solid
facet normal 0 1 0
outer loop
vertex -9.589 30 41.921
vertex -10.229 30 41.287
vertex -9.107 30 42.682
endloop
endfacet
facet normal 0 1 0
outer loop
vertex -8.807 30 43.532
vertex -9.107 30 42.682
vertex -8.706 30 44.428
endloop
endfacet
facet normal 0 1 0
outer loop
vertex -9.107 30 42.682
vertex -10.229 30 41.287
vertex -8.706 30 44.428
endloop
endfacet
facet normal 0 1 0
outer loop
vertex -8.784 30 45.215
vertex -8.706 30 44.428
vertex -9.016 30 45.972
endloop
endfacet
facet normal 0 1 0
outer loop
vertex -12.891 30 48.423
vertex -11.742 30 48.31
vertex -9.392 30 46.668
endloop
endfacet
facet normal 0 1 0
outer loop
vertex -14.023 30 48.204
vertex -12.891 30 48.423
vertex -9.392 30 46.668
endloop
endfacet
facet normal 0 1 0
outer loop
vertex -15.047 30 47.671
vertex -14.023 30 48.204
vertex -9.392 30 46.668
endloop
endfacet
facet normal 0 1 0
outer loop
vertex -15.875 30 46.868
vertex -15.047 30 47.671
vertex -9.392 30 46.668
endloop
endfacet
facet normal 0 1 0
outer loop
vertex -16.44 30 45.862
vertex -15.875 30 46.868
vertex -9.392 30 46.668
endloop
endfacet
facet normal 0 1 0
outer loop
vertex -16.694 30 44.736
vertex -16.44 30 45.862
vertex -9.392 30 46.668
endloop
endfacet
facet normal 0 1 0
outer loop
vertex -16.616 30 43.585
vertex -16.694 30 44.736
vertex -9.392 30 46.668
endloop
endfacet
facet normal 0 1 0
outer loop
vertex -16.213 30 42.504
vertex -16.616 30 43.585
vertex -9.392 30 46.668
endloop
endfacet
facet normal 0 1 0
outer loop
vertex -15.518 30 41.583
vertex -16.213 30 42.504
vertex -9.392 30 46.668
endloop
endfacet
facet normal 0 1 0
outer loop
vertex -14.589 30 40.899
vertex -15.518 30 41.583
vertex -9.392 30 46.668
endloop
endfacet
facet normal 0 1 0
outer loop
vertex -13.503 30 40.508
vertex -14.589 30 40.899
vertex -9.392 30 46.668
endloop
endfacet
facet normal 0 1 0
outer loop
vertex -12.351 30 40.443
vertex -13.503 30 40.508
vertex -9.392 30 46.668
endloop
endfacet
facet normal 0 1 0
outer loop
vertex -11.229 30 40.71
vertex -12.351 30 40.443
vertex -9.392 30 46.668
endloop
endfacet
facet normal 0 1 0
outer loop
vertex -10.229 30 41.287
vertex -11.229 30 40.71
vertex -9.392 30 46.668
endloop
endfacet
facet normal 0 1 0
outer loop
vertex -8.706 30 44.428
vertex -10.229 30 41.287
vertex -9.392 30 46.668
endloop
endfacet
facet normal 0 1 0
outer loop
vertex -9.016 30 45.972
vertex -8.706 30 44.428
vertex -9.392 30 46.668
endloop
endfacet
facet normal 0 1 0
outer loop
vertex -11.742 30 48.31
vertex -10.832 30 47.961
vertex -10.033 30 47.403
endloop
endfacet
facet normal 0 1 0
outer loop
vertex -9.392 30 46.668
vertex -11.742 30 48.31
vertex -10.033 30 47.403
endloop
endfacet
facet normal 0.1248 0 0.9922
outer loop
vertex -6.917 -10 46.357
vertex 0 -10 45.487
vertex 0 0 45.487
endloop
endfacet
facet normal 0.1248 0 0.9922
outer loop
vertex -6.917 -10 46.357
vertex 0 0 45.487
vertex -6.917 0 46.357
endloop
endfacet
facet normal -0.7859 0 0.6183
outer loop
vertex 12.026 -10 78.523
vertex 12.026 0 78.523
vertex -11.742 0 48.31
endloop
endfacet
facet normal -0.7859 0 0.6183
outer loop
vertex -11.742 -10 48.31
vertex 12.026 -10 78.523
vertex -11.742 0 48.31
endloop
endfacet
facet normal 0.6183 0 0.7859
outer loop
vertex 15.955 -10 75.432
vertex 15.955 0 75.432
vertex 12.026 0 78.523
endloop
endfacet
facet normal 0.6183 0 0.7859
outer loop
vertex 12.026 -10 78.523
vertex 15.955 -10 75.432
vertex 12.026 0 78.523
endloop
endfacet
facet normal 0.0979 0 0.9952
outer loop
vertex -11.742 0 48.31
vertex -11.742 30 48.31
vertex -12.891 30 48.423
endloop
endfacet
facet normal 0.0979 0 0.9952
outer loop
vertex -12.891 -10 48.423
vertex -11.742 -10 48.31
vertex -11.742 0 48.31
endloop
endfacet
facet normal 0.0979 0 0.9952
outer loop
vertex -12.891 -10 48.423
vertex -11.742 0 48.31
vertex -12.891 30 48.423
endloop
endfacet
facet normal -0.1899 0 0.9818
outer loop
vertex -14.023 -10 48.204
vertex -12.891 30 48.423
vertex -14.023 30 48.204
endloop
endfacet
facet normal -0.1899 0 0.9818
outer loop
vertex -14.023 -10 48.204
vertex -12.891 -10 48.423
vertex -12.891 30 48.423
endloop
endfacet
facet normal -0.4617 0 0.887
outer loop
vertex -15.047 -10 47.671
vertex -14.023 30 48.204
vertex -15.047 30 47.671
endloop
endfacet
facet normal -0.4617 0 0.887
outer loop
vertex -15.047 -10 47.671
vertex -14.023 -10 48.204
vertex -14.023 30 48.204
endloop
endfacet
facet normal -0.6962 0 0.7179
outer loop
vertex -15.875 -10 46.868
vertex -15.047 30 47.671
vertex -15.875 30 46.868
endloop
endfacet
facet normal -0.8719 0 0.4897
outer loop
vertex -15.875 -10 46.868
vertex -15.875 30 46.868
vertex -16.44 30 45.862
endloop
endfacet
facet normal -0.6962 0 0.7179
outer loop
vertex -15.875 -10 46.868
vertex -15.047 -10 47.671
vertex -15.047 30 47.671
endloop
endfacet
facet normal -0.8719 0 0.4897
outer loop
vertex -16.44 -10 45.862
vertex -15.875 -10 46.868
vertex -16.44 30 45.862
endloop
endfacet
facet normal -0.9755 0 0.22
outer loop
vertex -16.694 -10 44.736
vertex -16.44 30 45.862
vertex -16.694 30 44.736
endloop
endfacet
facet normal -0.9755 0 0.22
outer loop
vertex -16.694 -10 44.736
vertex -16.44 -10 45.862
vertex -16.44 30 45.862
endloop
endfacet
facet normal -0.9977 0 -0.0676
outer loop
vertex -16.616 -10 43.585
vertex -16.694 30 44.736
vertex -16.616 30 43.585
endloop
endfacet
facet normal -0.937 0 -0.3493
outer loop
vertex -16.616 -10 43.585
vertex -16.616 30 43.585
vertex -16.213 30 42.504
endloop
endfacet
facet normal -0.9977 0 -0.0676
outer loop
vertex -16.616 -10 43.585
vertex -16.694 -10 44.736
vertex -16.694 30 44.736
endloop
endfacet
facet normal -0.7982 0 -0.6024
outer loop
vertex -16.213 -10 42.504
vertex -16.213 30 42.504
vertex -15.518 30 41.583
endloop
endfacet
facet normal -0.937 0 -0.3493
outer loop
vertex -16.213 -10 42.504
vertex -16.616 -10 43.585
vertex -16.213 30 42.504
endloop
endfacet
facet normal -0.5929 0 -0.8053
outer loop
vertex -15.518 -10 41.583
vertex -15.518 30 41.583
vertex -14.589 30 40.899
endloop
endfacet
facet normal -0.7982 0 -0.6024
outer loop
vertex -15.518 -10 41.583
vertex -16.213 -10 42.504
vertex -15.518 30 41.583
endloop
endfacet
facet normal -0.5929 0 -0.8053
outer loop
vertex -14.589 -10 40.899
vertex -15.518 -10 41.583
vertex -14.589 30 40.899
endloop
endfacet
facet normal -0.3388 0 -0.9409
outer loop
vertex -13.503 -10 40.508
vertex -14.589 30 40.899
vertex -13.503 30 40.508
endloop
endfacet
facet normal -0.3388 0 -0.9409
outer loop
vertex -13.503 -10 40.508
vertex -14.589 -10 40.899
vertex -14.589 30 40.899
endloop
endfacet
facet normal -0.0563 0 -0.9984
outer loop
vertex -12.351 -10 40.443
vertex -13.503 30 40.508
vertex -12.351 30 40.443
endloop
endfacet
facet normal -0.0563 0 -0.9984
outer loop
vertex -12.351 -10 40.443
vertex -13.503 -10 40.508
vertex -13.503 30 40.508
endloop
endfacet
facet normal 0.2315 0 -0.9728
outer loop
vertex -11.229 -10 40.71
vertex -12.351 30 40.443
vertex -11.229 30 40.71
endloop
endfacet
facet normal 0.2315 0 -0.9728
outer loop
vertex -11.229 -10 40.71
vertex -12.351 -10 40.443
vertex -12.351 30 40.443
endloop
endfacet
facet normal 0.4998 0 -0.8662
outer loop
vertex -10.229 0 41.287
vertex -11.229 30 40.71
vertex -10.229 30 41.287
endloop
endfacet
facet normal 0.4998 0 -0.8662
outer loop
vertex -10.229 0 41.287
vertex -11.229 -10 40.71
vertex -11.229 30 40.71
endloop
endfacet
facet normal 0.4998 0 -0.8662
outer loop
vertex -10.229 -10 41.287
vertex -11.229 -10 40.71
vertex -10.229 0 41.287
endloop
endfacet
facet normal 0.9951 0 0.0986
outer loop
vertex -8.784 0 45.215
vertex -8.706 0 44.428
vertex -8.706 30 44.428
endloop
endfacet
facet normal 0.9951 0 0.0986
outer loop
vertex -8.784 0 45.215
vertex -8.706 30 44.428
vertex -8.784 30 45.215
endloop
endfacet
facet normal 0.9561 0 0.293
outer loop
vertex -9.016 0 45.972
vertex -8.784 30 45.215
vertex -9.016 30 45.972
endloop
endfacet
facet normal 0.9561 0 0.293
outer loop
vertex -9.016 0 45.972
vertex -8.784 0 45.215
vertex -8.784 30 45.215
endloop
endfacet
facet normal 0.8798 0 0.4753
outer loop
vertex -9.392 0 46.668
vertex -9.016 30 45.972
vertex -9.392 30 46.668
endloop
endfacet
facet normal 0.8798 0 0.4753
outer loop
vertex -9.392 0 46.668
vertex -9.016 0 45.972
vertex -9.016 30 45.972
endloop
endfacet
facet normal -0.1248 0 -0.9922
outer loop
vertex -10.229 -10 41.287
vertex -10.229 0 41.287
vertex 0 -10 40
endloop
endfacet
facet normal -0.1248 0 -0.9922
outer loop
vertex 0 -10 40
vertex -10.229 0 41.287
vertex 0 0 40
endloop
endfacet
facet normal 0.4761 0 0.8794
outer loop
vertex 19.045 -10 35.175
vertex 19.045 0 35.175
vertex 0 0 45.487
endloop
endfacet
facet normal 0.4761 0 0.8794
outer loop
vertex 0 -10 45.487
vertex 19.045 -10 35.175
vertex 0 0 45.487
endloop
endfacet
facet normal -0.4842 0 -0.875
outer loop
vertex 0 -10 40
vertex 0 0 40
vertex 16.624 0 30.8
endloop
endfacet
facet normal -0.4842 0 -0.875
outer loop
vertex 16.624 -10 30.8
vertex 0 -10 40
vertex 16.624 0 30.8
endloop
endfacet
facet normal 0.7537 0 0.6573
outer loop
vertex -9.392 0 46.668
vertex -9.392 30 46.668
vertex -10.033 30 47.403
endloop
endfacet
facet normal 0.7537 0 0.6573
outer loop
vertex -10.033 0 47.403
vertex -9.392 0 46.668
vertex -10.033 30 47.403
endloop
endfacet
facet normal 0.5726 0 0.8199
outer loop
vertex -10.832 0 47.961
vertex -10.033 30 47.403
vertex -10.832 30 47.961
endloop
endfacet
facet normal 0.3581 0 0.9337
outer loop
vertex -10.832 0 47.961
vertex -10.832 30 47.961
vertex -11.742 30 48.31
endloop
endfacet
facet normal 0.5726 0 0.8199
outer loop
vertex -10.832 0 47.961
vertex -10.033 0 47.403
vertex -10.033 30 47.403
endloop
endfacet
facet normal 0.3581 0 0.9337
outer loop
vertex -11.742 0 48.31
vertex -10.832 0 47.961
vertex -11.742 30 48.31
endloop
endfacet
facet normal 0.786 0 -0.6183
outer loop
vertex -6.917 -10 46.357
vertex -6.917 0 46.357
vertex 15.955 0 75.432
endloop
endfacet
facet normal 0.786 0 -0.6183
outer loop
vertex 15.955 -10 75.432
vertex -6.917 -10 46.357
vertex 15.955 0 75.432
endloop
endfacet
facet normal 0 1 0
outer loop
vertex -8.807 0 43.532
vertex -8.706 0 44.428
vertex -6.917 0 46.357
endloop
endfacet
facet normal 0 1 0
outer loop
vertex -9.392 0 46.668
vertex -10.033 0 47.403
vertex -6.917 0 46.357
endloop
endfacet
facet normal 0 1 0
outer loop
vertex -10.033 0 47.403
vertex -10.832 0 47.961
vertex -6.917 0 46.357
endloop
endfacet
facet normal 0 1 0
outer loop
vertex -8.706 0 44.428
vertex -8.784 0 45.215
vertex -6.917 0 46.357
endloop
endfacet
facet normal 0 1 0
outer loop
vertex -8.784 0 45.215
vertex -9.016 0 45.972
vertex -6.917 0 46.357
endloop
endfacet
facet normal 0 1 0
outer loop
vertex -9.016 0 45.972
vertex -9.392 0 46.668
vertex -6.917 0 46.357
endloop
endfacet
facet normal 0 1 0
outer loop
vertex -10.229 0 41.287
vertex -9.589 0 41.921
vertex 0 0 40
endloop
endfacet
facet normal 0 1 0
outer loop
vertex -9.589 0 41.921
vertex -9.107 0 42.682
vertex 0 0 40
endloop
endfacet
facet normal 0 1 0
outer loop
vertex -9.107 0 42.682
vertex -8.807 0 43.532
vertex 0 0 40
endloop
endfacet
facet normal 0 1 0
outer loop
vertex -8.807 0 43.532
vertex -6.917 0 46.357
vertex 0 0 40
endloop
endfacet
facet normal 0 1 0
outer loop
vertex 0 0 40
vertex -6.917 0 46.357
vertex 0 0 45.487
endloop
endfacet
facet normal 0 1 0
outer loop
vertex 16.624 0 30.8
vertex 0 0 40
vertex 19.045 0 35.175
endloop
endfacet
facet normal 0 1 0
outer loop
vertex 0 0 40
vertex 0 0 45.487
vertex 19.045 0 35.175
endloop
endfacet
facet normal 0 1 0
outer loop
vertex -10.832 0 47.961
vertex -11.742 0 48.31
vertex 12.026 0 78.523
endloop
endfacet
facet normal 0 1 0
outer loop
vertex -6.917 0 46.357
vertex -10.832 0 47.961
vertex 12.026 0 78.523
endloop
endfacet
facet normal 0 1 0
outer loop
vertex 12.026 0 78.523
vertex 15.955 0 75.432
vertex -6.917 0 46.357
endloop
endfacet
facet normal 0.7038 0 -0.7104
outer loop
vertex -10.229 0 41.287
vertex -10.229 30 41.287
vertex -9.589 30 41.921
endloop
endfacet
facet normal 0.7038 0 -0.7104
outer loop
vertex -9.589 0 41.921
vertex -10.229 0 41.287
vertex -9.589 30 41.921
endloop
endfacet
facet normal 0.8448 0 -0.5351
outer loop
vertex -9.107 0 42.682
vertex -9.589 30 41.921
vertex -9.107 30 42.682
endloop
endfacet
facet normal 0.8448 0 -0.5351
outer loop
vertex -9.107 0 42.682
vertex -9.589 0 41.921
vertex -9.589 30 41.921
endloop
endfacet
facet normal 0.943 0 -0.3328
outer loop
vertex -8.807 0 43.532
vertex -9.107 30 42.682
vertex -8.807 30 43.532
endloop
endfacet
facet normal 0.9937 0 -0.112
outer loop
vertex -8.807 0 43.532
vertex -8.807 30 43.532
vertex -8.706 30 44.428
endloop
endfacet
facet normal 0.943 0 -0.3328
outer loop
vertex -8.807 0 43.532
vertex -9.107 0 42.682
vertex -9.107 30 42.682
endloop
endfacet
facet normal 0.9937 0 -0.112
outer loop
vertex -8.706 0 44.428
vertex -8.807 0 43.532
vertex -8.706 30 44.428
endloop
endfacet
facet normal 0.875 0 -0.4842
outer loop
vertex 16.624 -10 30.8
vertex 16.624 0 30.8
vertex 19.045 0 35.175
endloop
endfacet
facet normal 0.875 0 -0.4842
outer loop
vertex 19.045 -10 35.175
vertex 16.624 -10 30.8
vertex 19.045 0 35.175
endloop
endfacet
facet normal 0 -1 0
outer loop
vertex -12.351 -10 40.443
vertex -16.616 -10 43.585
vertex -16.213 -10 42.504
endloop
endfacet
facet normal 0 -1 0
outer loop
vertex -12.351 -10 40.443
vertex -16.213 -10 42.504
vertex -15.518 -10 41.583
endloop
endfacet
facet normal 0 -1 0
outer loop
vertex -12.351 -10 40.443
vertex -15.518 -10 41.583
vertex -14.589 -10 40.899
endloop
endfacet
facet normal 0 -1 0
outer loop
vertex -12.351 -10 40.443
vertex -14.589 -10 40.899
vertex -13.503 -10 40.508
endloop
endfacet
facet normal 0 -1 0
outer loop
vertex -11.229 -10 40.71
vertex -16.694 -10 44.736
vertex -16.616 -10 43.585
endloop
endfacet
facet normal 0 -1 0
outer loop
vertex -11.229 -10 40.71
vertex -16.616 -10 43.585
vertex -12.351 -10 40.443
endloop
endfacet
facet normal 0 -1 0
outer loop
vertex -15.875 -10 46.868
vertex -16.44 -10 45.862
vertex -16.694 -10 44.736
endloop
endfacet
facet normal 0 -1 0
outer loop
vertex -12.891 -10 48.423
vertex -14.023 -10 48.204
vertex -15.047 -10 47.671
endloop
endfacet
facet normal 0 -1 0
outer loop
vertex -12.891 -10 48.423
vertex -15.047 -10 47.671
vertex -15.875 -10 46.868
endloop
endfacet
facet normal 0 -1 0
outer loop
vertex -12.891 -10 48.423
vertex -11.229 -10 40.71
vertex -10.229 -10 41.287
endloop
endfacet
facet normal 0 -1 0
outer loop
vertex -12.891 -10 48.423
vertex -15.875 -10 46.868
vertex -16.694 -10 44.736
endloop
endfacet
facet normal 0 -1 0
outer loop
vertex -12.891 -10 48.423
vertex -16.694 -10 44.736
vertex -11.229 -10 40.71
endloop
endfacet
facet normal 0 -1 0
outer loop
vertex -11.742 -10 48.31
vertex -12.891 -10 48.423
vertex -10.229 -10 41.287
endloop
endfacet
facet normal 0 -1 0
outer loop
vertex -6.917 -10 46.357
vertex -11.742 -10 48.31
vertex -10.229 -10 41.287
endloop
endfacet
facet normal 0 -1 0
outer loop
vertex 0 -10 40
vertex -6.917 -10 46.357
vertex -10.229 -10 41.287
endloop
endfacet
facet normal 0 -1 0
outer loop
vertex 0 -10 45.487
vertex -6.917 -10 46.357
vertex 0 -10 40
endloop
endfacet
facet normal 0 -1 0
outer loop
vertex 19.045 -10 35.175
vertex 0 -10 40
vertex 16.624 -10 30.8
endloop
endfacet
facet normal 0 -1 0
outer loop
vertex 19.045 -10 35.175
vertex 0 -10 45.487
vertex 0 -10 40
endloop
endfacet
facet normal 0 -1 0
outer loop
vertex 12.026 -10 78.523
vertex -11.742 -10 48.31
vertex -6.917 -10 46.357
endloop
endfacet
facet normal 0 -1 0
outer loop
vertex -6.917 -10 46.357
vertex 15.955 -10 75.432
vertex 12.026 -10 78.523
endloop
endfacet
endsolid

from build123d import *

# Parameters (mm, degrees)
F1_DEPTH = 10
F2_DEPTH = 10
F3_DEPTH = 30


with BuildPart() as f1:
    # F0 (on Front) → F1 (new body)
    with BuildSketch(Plane.XZ):
        with BuildLine():
            Line((-12.7058480853, 41.598128256), (-10.2291550788, 41.2866124053))
            ThreePointArc((-10.2291550788, 41.2866124053), (-9.1067668118, 42.6821747975), (-8.7058480853, 44.4276300352))
            ThreePointArc((-8.7058480853, 44.4276300352), (-8.8812998063, 45.5993085158), (-9.3922633163, 46.6682004935))
            Line((-9.3922633163, 46.6682004935), (-12.7058480853, 47.084979713))
            Line((-12.7058480853, 47.084979713), (-12.7058480853, 41.598128256))
        make_face()
        with BuildLine():
            ThreePointArc((-11.7422820262, 48.3098382277), (-16.6161256775, 43.5851757919), (-10.2291550788, 41.2866124053))
            Line((-10.2291550788, 41.2866124053), (-12.7058480853, 41.598128256))
            Line((-12.7058480853, 41.598128256), (-12.7058480853, 47.084979713))
            Line((-12.7058480853, 47.084979713), (-11.7422820262, 48.3098382277))
        make_face()
        with BuildLine():
            ThreePointArc((-9.3922633163, 46.6682004935), (-10.4151607617, 47.7067688834), (-11.7422820262, 48.3098382277))
            Line((-11.7422820262, 48.3098382277), (-12.7058480853, 47.084979713))
            Line((-12.7058480853, 47.084979713), (-9.3922633163, 46.6682004935))
        make_face()
    extrude(amount=F1_DEPTH)

    # F0 (on Front) → F2 (join)
    with BuildSketch(Plane.XZ):
        with BuildLine():
            Line((-10.2291550788, 41.2866124053), (0, 40))
            Line((0, 40), (16.6241960095, 30.8002115765))
            Line((16.6241960095, 30.8002115765), (19.0451929631, 35.175))
            Line((19.0451929631, 35.175), (0, 45.486851457))
            Line((0, 45.486851457), (-6.9169276979, 46.3568553736))
            Line((-6.9169276979, 46.3568553736), (-9.3922633163, 46.6682004935))
            ThreePointArc((-9.3922633163, 46.6682004935), (-8.8812998063, 45.5993085158), (-8.7058480853, 44.4276300352))
            ThreePointArc((-8.7058480853, 44.4276300352), (-9.1067668118, 42.6821747975), (-10.2291550788, 41.2866124053))
        make_face()
        with BuildLine():
            Line((12.0256917617, 78.5230289018), (-11.7422820262, 48.3098382277))
            ThreePointArc((-11.7422820262, 48.3098382277), (-10.4151607617, 47.7067688834), (-9.3922633163, 46.6682004935))
            Line((-9.3922633163, 46.6682004935), (-6.9169276979, 46.3568553736))
            Line((-6.9169276979, 46.3568553736), (15.9554479103, 75.4315864209))
            Line((15.9554479103, 75.4315864209), (12.0256917617, 78.5230289018))
        make_face()
    extrude(amount=F2_DEPTH)

    # F0 (on Front) → F3 (join)
    with BuildSketch(Plane.XZ):
        with BuildLine():
            Line((-12.7058480853, 41.598128256), (-10.2291550788, 41.2866124053))
            ThreePointArc((-10.2291550788, 41.2866124053), (-9.1067668118, 42.6821747975), (-8.7058480853, 44.4276300352))
            ThreePointArc((-8.7058480853, 44.4276300352), (-8.8812998063, 45.5993085158), (-9.3922633163, 46.6682004935))
            Line((-9.3922633163, 46.6682004935), (-12.7058480853, 47.084979713))
            Line((-12.7058480853, 47.084979713), (-12.7058480853, 41.598128256))
        make_face()
        with BuildLine():
            ThreePointArc((-9.3922633163, 46.6682004935), (-10.4151607617, 47.7067688834), (-11.7422820262, 48.3098382277))
            Line((-11.7422820262, 48.3098382277), (-12.7058480853, 47.084979713))
            Line((-12.7058480853, 47.084979713), (-9.3922633163, 46.6682004935))
        make_face()
        with BuildLine():
            ThreePointArc((-11.7422820262, 48.3098382277), (-16.6161256775, 43.5851757919), (-10.2291550788, 41.2866124053))
            Line((-10.2291550788, 41.2866124053), (-12.7058480853, 41.598128256))
            Line((-12.7058480853, 41.598128256), (-12.7058480853, 47.084979713))
            Line((-12.7058480853, 47.084979713), (-11.7422820262, 48.3098382277))
        make_face()
    extrude(amount=-F3_DEPTH)


solid = f1.part
